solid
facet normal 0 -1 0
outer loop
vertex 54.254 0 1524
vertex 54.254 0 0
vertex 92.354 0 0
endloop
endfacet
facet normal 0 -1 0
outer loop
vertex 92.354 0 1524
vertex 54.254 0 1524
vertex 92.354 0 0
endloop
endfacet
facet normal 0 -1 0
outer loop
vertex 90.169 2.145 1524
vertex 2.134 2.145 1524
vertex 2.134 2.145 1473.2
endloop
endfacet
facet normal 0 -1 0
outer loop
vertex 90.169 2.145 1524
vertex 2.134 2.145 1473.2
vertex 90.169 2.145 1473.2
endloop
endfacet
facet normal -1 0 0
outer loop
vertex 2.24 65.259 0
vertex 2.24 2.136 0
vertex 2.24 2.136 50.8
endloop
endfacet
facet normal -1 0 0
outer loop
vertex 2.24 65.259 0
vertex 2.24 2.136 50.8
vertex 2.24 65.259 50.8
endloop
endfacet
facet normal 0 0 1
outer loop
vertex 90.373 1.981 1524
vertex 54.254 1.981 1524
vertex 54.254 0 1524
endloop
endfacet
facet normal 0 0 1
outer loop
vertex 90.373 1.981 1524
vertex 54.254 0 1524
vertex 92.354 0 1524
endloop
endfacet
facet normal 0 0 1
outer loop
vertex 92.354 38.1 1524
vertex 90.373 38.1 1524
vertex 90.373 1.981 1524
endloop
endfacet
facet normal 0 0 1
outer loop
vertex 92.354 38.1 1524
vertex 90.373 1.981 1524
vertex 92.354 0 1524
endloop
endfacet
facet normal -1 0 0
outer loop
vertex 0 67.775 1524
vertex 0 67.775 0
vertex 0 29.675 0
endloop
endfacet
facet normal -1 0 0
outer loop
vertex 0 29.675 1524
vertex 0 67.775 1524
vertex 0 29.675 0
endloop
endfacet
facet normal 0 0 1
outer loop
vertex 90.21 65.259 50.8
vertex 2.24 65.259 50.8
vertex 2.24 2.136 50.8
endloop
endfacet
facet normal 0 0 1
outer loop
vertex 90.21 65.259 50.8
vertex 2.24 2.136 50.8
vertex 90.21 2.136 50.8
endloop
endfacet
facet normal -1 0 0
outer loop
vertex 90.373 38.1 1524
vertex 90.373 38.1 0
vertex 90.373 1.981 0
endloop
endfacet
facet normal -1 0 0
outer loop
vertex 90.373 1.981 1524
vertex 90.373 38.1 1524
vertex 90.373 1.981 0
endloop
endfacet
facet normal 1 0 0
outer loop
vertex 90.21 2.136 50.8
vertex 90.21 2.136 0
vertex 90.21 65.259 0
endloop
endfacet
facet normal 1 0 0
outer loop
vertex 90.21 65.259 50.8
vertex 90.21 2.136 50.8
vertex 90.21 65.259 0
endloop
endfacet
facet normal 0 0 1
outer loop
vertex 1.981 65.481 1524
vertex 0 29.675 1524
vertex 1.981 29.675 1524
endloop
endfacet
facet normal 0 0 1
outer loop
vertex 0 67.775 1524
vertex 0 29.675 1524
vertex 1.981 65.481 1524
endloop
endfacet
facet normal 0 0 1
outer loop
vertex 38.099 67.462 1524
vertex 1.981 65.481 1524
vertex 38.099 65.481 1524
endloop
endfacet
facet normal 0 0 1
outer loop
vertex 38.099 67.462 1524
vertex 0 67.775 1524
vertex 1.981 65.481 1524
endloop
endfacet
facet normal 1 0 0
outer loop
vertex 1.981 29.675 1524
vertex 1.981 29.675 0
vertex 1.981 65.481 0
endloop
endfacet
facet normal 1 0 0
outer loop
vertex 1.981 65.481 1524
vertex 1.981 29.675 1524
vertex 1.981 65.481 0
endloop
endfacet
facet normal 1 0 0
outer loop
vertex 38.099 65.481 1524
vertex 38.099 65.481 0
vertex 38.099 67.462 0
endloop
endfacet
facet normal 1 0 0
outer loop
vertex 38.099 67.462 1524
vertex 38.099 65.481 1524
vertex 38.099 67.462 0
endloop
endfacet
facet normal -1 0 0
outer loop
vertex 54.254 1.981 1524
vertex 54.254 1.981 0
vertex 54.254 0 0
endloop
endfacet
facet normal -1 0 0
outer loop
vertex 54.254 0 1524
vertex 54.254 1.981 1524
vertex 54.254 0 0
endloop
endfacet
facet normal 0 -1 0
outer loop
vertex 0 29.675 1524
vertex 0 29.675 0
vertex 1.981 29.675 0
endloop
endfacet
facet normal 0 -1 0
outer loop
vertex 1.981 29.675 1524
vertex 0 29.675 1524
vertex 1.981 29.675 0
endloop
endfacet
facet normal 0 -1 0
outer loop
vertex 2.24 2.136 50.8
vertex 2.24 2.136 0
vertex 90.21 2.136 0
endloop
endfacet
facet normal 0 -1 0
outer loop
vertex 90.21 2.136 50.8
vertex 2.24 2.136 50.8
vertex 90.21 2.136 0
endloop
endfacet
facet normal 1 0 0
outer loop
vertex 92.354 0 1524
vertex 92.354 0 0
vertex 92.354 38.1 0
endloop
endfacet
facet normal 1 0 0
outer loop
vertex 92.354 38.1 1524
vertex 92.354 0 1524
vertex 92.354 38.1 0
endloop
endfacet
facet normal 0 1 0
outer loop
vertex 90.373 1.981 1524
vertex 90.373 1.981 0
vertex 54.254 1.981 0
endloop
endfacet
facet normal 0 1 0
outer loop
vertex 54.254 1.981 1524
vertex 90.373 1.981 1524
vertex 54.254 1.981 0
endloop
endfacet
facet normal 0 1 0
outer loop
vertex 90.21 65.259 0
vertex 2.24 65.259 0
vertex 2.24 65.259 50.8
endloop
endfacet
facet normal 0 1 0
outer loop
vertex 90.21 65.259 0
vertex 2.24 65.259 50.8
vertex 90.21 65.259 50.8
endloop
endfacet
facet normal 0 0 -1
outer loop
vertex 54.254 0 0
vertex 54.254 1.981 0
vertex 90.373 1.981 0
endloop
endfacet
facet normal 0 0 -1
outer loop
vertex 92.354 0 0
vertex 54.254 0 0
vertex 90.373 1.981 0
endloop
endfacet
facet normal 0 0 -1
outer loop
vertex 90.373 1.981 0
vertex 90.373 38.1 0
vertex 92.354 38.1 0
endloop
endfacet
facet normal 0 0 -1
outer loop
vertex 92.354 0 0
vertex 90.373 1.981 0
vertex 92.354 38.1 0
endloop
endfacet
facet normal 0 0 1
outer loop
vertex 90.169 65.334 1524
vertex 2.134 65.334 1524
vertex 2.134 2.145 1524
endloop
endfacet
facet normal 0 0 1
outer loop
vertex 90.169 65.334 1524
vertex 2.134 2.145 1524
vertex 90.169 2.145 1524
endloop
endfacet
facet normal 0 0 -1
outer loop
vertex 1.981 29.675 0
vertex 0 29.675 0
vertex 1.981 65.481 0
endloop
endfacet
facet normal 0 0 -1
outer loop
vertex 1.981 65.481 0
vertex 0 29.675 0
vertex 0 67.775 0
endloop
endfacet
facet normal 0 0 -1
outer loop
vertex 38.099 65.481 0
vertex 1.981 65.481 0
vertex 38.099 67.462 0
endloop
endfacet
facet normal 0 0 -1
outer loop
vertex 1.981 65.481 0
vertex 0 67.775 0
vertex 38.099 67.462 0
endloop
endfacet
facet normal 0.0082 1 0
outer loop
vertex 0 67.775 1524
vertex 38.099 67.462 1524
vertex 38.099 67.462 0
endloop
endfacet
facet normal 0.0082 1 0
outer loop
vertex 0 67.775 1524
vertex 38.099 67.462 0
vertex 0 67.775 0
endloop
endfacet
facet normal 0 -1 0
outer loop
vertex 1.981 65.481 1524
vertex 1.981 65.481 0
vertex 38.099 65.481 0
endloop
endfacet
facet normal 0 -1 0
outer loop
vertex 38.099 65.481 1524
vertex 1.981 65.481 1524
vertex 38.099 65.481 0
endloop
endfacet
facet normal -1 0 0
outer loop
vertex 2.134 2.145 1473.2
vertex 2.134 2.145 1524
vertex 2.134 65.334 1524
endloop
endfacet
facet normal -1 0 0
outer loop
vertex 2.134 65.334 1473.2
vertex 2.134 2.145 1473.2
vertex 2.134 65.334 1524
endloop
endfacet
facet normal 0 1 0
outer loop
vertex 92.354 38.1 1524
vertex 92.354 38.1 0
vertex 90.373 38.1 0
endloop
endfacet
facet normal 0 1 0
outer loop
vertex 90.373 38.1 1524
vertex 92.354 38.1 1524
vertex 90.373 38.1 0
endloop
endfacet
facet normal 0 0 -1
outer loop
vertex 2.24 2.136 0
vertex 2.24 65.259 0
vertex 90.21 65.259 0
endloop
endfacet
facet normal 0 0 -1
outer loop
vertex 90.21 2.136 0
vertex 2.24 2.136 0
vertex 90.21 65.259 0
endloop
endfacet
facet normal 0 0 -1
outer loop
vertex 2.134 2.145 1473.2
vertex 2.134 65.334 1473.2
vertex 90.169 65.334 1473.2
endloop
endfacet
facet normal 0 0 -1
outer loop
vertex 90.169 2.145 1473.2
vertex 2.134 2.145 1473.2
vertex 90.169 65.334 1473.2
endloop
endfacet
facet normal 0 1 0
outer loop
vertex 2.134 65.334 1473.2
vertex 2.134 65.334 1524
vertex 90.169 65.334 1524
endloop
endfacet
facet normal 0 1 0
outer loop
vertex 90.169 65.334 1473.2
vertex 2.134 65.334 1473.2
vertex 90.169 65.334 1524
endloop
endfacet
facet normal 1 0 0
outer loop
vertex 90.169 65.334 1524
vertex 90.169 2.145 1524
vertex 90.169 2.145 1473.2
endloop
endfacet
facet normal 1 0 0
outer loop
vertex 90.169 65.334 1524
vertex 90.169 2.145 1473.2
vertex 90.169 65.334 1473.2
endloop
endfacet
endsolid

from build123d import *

# Parameters (mm, degrees)
F1_DEPTH = 1524
F0_W     = 87.970057
F0_H     = 63.123137
F2_DEPTH = 50.8
F3_W     = 88.035125
F3_H     = 63.188991
F4_DEPTH = 50.8


with BuildPart() as f1:
    # F0 (on Top) → F1 (new body)
    with BuildSketch(Plane.XY):
        Polygon((38.09872, 67.4624), (0, 67.774666), (0, 29.674666), (1.9812, 29.674666), (1.9812, 65.4812), (38.09872, 65.4812), align=None)
        Polygon((54.2544, 1.9812), (54.2544, 0), (92.3544, 0), (92.3544, 38.1), (90.3732, 38.1), (90.3732, 1.9812), align=None)
    extrude(amount=F1_DEPTH)


with BuildPart() as f2:
    # F0 (on Top) → F2 (new body)
    with BuildSketch(Plane.XY):
        with Locations((46.224545, 33.697634)):
            Rectangle(F0_W, F0_H)
    extrude(amount=F2_DEPTH)


with BuildPart() as f4:
    # F3 (on face) → F4 (new body)
    with BuildSketch(Plane.XY.offset(1524)):
        with Locations((46.151122, 33.739967)):
            Rectangle(F3_W, F3_H)
    extrude(amount=-F4_DEPTH)


solid = Compound([f1.part, f2.part, f4.part])
